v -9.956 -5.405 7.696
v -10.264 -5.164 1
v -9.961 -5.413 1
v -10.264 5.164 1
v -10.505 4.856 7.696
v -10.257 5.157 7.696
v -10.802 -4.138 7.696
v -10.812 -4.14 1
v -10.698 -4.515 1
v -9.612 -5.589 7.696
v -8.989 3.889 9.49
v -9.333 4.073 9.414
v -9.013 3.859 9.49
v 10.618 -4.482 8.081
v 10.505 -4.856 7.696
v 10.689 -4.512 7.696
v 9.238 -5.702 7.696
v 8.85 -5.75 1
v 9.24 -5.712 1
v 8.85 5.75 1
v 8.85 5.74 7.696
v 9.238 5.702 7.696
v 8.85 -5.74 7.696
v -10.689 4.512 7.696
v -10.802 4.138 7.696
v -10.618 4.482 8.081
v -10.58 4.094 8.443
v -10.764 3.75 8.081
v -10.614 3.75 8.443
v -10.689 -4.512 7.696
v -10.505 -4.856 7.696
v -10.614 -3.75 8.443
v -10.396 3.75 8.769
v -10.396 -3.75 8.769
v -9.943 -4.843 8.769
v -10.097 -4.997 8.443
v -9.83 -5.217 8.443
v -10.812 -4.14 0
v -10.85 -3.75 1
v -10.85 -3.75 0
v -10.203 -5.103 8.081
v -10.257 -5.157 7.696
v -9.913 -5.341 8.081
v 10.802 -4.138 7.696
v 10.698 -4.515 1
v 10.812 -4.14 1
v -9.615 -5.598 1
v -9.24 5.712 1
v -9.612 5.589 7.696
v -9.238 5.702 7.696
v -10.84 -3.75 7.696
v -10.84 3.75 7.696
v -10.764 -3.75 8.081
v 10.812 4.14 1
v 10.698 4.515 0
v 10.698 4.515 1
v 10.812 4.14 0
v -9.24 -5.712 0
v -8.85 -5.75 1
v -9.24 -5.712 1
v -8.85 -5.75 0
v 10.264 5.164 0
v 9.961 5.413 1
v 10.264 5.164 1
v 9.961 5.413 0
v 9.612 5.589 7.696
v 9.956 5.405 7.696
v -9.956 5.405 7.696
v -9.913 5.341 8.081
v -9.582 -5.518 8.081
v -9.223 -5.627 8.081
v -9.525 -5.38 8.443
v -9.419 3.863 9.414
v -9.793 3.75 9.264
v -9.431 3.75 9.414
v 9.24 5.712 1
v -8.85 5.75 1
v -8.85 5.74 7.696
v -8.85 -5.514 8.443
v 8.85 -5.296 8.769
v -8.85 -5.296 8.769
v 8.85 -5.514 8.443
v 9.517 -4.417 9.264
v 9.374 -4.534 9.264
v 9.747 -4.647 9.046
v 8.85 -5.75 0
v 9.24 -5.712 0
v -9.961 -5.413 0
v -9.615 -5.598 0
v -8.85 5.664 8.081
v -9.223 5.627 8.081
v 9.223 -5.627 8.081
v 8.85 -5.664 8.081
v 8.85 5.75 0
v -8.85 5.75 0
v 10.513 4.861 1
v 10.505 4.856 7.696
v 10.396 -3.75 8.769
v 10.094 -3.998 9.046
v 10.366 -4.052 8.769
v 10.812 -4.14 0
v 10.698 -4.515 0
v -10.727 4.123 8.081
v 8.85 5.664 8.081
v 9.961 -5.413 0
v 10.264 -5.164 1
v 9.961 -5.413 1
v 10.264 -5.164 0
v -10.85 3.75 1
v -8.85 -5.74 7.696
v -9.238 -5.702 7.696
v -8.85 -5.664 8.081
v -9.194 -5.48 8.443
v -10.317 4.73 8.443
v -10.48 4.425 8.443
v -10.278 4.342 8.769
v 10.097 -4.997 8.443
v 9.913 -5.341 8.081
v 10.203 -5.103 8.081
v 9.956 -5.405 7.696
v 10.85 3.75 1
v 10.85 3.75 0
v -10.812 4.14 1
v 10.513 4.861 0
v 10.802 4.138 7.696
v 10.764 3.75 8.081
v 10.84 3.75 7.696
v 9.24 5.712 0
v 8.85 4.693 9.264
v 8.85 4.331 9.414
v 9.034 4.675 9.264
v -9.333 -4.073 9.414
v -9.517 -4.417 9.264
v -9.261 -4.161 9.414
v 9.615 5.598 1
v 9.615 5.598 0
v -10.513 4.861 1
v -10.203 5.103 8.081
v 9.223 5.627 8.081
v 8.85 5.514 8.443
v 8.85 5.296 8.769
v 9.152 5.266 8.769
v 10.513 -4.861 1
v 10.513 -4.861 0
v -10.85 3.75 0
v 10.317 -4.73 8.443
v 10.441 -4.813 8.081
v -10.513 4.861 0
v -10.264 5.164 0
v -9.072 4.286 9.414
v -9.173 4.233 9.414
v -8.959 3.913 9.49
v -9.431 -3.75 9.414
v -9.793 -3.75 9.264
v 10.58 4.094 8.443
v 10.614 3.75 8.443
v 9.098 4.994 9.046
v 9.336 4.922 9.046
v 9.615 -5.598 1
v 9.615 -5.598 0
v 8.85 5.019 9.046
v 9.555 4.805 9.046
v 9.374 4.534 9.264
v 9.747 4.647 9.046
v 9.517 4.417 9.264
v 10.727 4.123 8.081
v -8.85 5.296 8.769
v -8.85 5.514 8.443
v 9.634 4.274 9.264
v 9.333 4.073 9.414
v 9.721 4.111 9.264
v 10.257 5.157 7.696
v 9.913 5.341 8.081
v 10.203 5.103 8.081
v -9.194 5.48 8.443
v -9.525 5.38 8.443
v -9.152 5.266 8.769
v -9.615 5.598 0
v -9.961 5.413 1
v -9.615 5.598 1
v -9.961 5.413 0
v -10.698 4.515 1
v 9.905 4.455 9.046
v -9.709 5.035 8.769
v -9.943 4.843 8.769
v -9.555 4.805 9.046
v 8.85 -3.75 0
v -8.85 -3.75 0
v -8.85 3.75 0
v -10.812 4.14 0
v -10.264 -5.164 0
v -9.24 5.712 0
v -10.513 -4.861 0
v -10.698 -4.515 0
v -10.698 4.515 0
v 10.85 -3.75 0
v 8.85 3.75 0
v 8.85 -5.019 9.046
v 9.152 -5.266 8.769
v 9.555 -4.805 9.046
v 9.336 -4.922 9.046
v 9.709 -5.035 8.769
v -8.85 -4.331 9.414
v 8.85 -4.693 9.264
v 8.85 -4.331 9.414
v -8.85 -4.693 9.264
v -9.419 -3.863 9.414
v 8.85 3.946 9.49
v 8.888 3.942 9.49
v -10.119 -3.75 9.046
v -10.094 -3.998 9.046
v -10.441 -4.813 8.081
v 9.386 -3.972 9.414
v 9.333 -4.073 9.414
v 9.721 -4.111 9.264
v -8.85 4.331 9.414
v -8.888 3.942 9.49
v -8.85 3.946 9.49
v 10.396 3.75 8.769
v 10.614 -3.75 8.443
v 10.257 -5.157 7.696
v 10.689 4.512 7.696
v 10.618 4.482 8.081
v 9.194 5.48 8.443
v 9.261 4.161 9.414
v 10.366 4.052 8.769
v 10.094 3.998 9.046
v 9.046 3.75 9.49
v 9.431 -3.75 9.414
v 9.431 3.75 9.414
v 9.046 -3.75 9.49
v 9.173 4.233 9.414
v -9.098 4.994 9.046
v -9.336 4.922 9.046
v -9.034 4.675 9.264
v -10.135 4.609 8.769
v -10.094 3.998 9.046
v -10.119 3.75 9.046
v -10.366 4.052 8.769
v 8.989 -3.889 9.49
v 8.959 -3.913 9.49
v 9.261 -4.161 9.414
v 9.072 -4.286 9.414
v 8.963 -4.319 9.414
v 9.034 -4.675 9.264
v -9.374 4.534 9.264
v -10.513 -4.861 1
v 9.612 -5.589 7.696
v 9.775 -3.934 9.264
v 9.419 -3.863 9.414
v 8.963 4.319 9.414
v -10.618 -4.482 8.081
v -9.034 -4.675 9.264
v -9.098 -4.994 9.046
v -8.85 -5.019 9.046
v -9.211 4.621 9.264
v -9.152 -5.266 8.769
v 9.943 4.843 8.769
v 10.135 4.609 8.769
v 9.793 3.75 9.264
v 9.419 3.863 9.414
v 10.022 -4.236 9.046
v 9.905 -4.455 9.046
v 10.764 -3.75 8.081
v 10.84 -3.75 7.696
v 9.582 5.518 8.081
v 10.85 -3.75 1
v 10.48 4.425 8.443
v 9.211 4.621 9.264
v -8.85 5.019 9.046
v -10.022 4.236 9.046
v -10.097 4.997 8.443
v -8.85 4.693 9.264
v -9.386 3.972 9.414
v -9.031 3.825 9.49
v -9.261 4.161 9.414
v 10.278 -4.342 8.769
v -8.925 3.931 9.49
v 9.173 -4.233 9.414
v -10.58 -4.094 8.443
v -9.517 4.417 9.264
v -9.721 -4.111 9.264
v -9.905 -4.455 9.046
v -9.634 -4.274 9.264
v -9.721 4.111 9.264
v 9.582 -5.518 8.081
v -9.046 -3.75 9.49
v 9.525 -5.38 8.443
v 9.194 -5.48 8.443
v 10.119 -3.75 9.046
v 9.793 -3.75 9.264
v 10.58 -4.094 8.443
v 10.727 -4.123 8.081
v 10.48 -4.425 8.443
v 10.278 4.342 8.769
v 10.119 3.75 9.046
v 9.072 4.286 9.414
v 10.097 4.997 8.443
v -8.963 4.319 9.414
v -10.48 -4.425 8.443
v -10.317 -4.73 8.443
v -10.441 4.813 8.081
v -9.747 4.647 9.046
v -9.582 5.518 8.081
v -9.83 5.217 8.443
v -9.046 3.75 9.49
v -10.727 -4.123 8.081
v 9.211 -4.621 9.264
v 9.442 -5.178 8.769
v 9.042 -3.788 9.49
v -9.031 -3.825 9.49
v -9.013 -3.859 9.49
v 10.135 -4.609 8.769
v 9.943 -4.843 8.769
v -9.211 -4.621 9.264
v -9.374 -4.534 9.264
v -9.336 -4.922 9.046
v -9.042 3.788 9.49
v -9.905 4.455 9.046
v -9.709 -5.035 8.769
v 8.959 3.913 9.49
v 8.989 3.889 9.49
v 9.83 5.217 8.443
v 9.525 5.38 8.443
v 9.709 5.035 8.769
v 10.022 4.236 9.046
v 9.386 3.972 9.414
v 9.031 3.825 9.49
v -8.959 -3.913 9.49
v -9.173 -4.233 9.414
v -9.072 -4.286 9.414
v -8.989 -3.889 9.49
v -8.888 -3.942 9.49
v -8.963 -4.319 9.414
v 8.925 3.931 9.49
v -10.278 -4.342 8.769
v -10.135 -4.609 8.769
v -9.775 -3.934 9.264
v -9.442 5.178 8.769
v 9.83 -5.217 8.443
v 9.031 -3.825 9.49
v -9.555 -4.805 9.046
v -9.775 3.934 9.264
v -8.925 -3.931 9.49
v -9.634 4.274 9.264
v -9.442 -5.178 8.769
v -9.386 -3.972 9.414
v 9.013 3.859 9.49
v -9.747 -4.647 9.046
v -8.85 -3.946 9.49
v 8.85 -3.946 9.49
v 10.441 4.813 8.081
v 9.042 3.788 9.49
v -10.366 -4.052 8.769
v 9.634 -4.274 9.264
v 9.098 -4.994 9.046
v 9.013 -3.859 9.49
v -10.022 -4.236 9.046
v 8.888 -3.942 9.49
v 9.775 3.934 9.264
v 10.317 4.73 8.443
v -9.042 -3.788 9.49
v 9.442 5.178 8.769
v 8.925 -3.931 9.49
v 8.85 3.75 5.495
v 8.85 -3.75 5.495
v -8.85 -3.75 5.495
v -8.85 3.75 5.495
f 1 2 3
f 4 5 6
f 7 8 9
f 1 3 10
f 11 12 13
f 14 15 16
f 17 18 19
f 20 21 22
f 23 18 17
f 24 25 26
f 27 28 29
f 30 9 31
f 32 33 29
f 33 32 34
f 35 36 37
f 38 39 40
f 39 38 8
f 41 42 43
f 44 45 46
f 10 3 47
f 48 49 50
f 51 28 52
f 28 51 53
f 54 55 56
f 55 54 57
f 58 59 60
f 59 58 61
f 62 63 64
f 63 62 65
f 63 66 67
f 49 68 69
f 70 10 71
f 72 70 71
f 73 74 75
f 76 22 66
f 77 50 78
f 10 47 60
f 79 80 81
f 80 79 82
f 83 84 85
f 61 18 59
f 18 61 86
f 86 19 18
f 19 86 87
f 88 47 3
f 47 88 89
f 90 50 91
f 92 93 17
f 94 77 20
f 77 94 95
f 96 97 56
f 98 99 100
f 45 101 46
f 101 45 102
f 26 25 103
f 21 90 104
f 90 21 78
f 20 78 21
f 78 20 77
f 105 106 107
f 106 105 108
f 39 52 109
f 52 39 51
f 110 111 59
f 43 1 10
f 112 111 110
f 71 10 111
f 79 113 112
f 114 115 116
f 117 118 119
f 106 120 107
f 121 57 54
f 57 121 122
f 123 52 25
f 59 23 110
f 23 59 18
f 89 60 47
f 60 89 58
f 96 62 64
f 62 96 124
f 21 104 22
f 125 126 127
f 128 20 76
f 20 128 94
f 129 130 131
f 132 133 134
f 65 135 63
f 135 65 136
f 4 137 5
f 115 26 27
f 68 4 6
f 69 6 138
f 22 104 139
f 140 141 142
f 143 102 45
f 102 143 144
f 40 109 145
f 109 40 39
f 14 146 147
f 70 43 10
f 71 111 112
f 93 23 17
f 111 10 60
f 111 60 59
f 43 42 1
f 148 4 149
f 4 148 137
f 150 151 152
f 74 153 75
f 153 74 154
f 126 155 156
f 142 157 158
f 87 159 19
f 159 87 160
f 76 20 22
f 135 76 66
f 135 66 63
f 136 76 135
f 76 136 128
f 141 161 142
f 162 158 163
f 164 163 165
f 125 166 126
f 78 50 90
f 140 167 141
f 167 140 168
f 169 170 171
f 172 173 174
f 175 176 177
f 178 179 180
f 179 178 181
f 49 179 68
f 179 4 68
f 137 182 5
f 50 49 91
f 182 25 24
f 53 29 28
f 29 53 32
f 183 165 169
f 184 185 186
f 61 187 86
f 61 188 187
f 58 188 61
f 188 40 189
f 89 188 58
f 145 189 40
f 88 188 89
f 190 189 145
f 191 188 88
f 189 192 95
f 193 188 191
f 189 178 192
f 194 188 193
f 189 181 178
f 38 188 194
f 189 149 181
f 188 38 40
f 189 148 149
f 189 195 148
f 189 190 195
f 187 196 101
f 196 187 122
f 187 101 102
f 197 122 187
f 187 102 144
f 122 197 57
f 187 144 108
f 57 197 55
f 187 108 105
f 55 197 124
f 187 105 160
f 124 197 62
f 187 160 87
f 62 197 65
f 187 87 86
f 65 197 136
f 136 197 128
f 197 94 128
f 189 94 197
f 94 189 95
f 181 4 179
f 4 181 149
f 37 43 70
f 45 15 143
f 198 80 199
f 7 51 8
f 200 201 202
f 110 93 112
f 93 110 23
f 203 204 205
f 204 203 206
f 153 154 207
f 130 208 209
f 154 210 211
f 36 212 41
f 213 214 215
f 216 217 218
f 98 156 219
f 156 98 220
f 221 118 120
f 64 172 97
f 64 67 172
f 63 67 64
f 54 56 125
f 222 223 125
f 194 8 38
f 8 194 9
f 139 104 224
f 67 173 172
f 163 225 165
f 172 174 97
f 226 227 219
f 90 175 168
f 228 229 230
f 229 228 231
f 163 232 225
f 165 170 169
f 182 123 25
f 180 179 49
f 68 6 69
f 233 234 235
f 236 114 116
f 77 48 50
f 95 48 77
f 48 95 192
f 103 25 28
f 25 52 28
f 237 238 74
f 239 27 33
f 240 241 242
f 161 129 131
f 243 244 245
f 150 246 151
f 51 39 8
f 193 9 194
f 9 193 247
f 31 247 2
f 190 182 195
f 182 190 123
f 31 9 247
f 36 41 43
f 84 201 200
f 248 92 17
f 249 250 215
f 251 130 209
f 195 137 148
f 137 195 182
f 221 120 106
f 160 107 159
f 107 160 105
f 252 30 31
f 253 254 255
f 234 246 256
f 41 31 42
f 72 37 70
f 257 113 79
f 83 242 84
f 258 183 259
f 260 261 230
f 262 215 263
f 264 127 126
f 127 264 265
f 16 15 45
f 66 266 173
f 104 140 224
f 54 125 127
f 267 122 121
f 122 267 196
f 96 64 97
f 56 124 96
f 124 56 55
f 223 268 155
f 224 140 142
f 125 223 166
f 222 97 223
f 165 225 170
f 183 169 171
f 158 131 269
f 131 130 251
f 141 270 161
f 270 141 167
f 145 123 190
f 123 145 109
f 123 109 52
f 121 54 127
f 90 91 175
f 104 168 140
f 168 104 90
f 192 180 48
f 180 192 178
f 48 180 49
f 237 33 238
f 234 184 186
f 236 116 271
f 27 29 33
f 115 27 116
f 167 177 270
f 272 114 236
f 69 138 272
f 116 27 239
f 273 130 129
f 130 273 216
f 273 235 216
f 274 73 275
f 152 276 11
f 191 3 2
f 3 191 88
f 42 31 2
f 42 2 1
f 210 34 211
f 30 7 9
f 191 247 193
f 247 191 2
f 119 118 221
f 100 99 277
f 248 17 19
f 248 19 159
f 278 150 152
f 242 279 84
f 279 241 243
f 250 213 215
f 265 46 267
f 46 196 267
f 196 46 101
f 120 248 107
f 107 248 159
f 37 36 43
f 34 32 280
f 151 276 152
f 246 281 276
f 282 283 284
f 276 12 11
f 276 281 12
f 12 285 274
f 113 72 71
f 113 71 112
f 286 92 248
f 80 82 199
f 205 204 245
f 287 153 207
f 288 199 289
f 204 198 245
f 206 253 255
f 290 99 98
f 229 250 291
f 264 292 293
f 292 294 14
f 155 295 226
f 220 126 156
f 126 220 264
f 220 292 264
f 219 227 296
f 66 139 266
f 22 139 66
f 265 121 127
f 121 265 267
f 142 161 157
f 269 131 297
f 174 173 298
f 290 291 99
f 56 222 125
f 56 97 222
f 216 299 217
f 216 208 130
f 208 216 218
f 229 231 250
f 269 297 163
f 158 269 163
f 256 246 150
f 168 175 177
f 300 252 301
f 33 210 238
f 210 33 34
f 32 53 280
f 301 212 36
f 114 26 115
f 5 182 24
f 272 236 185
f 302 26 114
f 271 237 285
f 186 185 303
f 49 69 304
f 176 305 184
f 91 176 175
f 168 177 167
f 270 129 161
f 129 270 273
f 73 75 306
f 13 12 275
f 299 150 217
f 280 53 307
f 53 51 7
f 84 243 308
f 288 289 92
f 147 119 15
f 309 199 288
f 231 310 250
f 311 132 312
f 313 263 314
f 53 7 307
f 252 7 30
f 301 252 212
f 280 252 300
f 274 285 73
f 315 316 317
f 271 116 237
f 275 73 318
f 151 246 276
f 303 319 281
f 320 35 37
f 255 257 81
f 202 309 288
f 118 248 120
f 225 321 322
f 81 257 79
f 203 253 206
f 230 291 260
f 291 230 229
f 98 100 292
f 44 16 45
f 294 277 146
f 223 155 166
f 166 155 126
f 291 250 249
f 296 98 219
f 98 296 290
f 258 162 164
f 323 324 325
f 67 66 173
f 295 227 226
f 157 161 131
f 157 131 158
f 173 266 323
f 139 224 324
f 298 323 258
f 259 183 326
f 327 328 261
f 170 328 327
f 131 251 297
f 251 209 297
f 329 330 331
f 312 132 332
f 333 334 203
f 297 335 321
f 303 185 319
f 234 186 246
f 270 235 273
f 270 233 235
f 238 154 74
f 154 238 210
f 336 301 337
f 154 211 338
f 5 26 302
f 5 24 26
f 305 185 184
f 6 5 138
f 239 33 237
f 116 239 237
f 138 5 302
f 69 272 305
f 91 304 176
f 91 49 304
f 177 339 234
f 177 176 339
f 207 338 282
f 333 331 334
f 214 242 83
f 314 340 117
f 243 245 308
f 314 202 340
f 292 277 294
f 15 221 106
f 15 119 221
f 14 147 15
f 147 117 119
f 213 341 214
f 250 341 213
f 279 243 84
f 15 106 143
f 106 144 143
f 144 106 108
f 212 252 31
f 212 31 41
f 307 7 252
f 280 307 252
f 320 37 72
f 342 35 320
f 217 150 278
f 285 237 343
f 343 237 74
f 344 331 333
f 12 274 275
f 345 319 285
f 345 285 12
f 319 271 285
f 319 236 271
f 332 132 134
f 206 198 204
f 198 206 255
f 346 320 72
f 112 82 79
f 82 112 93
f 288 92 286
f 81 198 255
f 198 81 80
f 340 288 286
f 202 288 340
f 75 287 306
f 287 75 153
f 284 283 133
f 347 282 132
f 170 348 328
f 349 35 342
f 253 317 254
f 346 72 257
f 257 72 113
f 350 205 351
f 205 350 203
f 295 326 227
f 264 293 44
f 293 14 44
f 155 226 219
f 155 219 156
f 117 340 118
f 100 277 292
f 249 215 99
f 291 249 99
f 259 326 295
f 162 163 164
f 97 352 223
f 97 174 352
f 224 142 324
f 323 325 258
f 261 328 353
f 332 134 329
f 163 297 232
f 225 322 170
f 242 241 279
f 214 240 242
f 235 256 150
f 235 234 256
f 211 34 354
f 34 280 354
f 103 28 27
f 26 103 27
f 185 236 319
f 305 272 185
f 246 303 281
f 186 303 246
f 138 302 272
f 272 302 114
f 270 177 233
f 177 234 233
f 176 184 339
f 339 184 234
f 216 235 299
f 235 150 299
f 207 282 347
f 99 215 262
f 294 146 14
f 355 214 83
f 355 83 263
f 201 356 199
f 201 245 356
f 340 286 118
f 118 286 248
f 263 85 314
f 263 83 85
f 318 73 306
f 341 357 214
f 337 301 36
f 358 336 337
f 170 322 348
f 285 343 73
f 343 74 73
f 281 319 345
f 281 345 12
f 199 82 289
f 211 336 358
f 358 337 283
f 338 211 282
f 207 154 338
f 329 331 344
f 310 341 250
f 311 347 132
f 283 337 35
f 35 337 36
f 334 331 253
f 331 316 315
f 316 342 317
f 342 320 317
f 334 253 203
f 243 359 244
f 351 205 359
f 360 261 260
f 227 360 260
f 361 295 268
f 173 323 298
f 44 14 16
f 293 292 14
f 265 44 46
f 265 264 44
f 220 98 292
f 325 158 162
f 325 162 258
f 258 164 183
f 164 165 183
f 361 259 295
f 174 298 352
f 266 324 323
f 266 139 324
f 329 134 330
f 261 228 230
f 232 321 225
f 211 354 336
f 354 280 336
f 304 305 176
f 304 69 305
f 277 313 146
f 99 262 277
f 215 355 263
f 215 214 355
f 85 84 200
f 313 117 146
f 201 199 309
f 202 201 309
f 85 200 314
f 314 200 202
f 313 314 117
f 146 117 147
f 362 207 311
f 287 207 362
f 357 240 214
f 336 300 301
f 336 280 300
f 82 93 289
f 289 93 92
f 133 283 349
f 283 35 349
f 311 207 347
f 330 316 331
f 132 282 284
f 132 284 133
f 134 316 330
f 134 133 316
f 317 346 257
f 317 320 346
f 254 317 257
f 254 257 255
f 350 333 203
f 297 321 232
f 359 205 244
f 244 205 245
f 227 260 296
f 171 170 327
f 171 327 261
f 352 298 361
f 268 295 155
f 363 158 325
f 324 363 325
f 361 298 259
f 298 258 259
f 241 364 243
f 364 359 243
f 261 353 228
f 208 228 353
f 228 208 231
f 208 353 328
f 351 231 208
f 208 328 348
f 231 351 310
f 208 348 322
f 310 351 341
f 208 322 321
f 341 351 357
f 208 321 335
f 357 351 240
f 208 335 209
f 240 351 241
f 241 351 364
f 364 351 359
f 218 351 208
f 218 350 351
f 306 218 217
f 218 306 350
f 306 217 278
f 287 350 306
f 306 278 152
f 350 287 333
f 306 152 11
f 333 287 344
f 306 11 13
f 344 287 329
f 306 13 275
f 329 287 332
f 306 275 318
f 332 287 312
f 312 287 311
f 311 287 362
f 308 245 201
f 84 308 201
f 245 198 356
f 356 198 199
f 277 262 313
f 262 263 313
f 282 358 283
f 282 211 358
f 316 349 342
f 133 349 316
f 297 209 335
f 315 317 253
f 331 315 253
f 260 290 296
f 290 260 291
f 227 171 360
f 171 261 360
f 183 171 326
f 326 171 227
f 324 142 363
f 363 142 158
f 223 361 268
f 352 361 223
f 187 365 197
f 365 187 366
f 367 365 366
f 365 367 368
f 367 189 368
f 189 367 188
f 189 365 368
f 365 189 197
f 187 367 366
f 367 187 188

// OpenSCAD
/* [Shell parameters] */
rounding_Radius = 2;
wall_Thickness = 2;

/* [Internal cube size] */
internal_Width = 17.7;
internal_Depth = 7.5;
internal_Height = 7.5;

/* [Hidden] */
$fn = 32;
delta = 0.01;//to get rid of artifacts on preview


difference() 
{
    rounded_cube(width = internal_Width + 2 * wall_Thickness, 
                depth = internal_Depth + 2 * wall_Thickness, 
                height = internal_Height + wall_Thickness, 
            rounding_Radius = rounding_Radius);
            

    translate([0, 0, internal_Height * 0.5 - delta - wall_Thickness]) 
        cube([internal_Width, internal_Depth, internal_Height + delta], center = true);
}

module rounded_cube(width, depth, height, rounding_Radius)
{
    half_width = width * 0.5;
    half_depth = depth * 0.5;
    half_height = height * 0.5;

    //TODO it should be centered optionaly with a parameter
    translate([0, 0, half_height]) 
    hull()
    {
        for (x = [-half_width + rounding_Radius, half_width - rounding_Radius])
        {
            for (y = [-half_depth + rounding_Radius, half_depth - rounding_Radius])
            {
                translate([x, y, half_height - rounding_Radius])
                    sphere(r = rounding_Radius);
                
                translate([x, y, -half_height])
                    cylinder(r = rounding_Radius);
            }
        }
    }
}
